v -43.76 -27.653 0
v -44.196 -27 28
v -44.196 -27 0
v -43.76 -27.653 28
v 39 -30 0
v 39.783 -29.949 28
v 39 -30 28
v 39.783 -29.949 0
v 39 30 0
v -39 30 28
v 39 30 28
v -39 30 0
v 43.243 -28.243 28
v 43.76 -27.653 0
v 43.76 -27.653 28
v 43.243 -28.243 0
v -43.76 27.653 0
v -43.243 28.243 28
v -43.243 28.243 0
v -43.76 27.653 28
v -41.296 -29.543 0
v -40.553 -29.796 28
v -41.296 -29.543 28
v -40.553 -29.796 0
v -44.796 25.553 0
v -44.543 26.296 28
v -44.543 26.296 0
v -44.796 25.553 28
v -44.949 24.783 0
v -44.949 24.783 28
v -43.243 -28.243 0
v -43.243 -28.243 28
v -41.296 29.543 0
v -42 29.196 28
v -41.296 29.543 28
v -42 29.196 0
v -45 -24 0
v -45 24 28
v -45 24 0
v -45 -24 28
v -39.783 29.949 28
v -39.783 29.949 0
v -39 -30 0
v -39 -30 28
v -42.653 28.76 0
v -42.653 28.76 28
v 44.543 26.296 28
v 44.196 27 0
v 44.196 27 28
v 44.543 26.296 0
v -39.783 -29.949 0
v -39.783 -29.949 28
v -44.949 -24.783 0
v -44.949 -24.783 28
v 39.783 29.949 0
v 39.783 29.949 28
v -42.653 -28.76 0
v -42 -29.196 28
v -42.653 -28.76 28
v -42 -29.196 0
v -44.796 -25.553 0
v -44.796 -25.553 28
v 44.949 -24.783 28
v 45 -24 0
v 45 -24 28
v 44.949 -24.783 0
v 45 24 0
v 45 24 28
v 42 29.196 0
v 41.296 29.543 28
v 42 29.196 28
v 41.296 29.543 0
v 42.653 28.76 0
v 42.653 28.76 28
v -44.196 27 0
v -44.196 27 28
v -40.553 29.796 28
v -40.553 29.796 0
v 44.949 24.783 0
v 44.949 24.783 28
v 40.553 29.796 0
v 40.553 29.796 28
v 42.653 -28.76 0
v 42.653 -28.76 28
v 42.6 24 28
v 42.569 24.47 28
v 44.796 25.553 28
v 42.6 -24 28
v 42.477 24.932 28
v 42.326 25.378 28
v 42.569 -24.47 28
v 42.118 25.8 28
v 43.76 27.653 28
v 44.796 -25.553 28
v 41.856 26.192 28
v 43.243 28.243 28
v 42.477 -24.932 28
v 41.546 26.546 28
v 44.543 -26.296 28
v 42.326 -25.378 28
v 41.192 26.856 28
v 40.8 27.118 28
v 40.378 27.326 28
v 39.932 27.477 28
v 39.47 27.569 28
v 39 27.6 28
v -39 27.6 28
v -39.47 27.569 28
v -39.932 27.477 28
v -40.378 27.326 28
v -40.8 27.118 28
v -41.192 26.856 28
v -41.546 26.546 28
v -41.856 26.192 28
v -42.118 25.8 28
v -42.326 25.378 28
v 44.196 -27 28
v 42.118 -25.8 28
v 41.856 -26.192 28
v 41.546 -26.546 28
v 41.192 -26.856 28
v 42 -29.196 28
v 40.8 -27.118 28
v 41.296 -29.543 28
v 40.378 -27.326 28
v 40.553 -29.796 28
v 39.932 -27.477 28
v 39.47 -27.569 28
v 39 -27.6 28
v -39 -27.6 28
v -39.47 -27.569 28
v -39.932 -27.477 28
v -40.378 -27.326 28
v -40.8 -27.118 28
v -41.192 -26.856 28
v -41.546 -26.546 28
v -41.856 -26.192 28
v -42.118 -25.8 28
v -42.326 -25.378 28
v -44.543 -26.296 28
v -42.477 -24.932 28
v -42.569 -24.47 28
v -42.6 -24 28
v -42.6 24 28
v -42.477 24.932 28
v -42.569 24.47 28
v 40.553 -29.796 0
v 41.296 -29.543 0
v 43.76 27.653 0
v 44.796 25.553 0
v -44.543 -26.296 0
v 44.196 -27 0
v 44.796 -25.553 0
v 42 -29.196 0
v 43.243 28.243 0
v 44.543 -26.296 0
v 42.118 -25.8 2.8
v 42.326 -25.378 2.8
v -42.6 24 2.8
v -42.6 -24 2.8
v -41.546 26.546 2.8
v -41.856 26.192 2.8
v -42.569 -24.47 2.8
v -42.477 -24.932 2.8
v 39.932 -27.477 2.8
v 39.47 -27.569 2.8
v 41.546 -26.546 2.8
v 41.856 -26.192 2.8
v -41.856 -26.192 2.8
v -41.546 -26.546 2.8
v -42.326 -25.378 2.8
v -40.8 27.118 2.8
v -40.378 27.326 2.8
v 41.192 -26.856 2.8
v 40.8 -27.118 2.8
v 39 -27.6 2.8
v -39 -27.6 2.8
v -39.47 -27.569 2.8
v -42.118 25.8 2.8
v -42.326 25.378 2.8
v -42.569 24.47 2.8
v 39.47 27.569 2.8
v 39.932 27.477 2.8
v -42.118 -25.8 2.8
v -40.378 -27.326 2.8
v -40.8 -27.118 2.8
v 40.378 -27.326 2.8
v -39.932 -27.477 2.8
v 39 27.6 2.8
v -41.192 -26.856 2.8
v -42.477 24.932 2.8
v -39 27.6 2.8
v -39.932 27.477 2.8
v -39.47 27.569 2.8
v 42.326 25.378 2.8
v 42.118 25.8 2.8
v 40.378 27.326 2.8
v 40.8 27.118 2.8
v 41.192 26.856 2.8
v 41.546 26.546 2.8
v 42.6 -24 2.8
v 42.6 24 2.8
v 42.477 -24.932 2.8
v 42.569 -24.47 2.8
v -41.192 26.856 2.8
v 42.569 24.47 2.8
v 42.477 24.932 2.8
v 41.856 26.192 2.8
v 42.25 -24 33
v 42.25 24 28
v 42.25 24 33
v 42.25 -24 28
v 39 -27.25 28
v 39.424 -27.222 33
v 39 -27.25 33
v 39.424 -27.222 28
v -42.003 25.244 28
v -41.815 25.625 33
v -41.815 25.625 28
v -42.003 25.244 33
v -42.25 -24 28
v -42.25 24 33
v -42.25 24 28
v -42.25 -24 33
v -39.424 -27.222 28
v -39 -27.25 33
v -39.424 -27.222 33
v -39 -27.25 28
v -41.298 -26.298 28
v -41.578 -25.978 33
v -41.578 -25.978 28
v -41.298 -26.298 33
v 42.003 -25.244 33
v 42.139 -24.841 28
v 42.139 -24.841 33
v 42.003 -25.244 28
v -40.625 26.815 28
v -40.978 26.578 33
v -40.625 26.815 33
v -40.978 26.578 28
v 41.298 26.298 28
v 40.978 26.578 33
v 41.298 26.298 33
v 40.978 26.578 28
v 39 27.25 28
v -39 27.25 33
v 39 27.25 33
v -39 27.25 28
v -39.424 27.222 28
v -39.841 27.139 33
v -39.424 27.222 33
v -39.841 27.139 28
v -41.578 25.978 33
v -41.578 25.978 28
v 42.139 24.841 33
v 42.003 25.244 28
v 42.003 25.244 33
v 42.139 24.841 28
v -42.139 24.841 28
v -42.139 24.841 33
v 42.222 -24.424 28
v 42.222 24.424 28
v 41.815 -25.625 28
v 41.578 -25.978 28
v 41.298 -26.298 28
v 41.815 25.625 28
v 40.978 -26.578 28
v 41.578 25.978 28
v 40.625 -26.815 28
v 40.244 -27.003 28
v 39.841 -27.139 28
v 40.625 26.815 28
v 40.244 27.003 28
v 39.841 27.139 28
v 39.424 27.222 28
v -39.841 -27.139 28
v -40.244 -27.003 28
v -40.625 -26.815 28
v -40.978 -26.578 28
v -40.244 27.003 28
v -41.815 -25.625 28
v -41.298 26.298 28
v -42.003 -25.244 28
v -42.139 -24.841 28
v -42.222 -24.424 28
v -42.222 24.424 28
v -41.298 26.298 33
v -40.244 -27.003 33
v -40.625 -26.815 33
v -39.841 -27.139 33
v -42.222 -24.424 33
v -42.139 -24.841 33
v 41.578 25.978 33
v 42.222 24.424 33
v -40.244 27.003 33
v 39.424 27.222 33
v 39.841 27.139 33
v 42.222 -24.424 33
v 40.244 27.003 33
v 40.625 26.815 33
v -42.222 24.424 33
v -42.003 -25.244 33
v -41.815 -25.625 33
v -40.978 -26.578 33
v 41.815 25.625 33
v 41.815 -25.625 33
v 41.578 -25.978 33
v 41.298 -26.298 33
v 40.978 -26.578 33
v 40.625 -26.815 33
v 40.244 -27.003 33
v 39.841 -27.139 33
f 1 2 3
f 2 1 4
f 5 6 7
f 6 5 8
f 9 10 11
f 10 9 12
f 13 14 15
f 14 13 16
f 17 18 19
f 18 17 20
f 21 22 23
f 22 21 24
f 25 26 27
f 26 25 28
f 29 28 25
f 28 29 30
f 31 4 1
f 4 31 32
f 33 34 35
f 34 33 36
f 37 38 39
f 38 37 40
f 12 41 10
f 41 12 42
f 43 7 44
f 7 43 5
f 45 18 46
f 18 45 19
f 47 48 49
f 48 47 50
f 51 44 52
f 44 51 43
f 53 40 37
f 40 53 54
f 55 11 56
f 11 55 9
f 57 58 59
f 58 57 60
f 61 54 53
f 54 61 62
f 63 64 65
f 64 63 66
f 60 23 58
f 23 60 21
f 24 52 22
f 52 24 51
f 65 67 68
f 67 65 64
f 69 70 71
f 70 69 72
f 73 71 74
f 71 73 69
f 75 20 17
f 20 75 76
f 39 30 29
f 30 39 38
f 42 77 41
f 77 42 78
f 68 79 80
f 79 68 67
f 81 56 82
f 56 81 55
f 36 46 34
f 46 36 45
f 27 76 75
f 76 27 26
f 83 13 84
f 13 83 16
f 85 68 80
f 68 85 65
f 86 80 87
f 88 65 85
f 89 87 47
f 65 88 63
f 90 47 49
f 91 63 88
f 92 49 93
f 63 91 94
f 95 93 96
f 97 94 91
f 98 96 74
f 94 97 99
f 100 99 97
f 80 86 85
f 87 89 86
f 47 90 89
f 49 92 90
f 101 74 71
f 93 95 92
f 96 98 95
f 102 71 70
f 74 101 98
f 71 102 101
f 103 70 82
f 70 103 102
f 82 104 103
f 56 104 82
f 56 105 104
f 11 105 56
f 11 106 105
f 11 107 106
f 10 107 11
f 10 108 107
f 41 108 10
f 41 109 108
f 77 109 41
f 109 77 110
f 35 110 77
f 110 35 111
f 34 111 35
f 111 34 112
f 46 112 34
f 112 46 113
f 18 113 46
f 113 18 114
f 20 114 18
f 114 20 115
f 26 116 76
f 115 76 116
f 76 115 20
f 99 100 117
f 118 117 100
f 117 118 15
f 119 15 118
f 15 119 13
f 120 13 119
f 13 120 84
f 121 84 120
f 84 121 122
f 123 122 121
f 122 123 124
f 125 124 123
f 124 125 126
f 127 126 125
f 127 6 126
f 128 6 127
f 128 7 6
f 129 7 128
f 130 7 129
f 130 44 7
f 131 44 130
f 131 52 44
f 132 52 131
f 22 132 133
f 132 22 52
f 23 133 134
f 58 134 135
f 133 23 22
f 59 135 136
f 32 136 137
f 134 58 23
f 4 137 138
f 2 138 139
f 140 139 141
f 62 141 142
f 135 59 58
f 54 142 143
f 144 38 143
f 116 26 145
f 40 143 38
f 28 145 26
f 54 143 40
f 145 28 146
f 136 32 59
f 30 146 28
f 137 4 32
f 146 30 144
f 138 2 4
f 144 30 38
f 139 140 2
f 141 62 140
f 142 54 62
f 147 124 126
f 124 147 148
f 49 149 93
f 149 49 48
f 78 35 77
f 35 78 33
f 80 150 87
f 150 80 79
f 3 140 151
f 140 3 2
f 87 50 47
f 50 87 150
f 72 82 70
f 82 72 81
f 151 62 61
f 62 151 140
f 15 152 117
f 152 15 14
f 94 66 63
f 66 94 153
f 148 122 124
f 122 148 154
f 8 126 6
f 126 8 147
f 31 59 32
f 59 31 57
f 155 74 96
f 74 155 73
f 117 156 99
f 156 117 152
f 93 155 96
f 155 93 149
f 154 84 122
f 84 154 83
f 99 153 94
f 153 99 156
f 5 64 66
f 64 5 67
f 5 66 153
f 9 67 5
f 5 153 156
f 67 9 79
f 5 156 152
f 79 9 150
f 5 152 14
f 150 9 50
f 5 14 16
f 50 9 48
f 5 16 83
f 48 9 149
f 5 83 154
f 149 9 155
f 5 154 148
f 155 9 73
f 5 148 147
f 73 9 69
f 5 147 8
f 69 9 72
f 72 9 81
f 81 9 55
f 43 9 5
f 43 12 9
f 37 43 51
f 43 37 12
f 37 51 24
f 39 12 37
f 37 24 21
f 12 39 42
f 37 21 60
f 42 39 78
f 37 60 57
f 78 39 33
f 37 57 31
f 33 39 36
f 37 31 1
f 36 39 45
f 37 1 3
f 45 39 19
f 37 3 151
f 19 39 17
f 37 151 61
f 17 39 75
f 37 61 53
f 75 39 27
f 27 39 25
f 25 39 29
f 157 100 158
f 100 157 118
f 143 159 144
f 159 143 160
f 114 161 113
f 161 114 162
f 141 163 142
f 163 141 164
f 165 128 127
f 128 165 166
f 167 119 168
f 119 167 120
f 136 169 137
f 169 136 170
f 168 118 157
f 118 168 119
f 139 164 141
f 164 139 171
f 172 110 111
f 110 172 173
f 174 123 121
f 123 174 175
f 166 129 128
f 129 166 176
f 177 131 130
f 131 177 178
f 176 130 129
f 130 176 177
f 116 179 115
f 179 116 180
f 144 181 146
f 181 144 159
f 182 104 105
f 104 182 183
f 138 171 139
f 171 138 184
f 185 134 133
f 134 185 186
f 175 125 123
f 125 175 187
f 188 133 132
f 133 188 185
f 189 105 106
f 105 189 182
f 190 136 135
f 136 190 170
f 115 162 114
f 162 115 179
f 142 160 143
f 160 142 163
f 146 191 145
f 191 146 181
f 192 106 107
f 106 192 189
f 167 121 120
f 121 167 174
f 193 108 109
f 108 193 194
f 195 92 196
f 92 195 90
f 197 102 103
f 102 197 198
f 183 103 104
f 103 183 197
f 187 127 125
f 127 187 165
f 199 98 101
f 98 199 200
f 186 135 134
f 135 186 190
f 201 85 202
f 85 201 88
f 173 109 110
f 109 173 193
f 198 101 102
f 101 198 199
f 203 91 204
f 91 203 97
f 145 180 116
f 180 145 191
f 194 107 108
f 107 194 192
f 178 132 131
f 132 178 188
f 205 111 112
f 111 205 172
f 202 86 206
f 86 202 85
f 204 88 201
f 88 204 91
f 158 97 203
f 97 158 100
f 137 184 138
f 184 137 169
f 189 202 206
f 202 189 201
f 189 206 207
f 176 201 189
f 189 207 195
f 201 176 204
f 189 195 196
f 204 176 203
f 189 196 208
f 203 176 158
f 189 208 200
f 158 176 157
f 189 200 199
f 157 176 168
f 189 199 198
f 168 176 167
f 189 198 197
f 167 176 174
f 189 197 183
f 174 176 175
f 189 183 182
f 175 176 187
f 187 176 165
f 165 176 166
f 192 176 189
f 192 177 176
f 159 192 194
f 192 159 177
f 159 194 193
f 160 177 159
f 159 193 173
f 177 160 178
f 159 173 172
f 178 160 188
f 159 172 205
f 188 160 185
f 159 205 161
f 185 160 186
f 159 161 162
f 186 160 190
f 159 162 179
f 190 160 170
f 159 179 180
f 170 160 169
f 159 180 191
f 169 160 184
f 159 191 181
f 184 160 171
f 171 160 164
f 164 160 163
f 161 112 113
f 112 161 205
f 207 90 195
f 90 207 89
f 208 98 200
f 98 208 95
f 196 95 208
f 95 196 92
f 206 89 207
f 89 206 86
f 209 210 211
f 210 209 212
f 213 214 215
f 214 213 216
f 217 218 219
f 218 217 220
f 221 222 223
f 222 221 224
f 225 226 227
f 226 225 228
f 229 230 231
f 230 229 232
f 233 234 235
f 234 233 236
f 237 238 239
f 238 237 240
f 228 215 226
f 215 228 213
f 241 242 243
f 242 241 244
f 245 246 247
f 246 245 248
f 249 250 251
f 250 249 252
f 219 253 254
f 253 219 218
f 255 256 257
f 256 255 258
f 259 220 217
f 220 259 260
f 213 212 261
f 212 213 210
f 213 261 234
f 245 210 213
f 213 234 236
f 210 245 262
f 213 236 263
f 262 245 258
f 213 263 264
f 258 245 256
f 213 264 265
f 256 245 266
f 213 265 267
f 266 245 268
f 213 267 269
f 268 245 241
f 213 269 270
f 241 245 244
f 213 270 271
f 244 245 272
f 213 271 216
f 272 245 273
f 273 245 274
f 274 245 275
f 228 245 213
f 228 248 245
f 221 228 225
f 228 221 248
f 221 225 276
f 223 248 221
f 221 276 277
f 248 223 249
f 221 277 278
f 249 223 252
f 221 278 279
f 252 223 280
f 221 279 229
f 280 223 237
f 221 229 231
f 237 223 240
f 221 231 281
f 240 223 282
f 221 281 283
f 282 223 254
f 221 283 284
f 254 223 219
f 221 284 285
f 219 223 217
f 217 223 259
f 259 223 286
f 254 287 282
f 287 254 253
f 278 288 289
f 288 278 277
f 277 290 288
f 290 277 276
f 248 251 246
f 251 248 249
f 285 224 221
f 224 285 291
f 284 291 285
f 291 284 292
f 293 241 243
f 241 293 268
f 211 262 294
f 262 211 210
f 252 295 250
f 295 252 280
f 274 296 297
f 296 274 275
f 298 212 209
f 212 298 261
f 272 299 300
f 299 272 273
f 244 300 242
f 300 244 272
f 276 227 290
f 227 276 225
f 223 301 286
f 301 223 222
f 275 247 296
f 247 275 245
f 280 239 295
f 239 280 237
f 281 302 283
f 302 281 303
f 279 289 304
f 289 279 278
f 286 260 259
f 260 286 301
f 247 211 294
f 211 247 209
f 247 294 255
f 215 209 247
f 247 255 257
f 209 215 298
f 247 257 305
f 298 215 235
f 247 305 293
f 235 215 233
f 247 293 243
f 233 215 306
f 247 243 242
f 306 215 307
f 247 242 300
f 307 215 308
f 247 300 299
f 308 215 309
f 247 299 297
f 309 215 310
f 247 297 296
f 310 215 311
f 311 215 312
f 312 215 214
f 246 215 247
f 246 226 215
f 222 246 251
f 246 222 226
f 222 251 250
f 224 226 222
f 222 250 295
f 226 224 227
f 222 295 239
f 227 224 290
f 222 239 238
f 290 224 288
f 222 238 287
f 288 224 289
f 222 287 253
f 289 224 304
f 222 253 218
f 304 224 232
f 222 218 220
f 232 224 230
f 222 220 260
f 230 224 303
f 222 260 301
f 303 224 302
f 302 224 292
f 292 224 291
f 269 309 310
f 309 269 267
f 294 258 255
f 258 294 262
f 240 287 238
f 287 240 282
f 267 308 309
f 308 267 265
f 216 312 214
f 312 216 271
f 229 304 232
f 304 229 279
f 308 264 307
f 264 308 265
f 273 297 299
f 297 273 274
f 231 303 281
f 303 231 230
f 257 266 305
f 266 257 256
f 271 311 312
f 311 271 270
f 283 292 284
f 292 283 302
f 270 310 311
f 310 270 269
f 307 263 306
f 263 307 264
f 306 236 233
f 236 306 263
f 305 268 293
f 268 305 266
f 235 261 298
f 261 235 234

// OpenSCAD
// Project Enclosure
outer_width = 90;
outer_depth = 60;
outer_height = 28;
wall_thickness = 2.4;
floor_thickness = 2.8;
corner_radius = 6;
lid_lip_height = 5;
lid_clearance = 0.35;

$fn = 48;

module rounded_rect(size = [outer_width, outer_depth], r = corner_radius) {
  offset(r = r) {
    offset(delta = -r) {
      square(size, center = true);
    }
  }
}

difference() {
  linear_extrude(height = outer_height) rounded_rect();

  translate([0, 0, floor_thickness]) {
    linear_extrude(height = outer_height - floor_thickness + 0.2) {
      rounded_rect(
        [outer_width - 2 * wall_thickness, outer_depth - 2 * wall_thickness],
        max(corner_radius - wall_thickness, 0.8)
      );
    }
  }
}

translate([0, 0, outer_height]) {
  linear_extrude(height = lid_lip_height) {
    rounded_rect(
      [
        outer_width - 2 * (wall_thickness + lid_clearance),
        outer_depth - 2 * (wall_thickness + lid_clearance)
      ],
      max(corner_radius - wall_thickness - lid_clearance, 0.8)
    );
  }
}
